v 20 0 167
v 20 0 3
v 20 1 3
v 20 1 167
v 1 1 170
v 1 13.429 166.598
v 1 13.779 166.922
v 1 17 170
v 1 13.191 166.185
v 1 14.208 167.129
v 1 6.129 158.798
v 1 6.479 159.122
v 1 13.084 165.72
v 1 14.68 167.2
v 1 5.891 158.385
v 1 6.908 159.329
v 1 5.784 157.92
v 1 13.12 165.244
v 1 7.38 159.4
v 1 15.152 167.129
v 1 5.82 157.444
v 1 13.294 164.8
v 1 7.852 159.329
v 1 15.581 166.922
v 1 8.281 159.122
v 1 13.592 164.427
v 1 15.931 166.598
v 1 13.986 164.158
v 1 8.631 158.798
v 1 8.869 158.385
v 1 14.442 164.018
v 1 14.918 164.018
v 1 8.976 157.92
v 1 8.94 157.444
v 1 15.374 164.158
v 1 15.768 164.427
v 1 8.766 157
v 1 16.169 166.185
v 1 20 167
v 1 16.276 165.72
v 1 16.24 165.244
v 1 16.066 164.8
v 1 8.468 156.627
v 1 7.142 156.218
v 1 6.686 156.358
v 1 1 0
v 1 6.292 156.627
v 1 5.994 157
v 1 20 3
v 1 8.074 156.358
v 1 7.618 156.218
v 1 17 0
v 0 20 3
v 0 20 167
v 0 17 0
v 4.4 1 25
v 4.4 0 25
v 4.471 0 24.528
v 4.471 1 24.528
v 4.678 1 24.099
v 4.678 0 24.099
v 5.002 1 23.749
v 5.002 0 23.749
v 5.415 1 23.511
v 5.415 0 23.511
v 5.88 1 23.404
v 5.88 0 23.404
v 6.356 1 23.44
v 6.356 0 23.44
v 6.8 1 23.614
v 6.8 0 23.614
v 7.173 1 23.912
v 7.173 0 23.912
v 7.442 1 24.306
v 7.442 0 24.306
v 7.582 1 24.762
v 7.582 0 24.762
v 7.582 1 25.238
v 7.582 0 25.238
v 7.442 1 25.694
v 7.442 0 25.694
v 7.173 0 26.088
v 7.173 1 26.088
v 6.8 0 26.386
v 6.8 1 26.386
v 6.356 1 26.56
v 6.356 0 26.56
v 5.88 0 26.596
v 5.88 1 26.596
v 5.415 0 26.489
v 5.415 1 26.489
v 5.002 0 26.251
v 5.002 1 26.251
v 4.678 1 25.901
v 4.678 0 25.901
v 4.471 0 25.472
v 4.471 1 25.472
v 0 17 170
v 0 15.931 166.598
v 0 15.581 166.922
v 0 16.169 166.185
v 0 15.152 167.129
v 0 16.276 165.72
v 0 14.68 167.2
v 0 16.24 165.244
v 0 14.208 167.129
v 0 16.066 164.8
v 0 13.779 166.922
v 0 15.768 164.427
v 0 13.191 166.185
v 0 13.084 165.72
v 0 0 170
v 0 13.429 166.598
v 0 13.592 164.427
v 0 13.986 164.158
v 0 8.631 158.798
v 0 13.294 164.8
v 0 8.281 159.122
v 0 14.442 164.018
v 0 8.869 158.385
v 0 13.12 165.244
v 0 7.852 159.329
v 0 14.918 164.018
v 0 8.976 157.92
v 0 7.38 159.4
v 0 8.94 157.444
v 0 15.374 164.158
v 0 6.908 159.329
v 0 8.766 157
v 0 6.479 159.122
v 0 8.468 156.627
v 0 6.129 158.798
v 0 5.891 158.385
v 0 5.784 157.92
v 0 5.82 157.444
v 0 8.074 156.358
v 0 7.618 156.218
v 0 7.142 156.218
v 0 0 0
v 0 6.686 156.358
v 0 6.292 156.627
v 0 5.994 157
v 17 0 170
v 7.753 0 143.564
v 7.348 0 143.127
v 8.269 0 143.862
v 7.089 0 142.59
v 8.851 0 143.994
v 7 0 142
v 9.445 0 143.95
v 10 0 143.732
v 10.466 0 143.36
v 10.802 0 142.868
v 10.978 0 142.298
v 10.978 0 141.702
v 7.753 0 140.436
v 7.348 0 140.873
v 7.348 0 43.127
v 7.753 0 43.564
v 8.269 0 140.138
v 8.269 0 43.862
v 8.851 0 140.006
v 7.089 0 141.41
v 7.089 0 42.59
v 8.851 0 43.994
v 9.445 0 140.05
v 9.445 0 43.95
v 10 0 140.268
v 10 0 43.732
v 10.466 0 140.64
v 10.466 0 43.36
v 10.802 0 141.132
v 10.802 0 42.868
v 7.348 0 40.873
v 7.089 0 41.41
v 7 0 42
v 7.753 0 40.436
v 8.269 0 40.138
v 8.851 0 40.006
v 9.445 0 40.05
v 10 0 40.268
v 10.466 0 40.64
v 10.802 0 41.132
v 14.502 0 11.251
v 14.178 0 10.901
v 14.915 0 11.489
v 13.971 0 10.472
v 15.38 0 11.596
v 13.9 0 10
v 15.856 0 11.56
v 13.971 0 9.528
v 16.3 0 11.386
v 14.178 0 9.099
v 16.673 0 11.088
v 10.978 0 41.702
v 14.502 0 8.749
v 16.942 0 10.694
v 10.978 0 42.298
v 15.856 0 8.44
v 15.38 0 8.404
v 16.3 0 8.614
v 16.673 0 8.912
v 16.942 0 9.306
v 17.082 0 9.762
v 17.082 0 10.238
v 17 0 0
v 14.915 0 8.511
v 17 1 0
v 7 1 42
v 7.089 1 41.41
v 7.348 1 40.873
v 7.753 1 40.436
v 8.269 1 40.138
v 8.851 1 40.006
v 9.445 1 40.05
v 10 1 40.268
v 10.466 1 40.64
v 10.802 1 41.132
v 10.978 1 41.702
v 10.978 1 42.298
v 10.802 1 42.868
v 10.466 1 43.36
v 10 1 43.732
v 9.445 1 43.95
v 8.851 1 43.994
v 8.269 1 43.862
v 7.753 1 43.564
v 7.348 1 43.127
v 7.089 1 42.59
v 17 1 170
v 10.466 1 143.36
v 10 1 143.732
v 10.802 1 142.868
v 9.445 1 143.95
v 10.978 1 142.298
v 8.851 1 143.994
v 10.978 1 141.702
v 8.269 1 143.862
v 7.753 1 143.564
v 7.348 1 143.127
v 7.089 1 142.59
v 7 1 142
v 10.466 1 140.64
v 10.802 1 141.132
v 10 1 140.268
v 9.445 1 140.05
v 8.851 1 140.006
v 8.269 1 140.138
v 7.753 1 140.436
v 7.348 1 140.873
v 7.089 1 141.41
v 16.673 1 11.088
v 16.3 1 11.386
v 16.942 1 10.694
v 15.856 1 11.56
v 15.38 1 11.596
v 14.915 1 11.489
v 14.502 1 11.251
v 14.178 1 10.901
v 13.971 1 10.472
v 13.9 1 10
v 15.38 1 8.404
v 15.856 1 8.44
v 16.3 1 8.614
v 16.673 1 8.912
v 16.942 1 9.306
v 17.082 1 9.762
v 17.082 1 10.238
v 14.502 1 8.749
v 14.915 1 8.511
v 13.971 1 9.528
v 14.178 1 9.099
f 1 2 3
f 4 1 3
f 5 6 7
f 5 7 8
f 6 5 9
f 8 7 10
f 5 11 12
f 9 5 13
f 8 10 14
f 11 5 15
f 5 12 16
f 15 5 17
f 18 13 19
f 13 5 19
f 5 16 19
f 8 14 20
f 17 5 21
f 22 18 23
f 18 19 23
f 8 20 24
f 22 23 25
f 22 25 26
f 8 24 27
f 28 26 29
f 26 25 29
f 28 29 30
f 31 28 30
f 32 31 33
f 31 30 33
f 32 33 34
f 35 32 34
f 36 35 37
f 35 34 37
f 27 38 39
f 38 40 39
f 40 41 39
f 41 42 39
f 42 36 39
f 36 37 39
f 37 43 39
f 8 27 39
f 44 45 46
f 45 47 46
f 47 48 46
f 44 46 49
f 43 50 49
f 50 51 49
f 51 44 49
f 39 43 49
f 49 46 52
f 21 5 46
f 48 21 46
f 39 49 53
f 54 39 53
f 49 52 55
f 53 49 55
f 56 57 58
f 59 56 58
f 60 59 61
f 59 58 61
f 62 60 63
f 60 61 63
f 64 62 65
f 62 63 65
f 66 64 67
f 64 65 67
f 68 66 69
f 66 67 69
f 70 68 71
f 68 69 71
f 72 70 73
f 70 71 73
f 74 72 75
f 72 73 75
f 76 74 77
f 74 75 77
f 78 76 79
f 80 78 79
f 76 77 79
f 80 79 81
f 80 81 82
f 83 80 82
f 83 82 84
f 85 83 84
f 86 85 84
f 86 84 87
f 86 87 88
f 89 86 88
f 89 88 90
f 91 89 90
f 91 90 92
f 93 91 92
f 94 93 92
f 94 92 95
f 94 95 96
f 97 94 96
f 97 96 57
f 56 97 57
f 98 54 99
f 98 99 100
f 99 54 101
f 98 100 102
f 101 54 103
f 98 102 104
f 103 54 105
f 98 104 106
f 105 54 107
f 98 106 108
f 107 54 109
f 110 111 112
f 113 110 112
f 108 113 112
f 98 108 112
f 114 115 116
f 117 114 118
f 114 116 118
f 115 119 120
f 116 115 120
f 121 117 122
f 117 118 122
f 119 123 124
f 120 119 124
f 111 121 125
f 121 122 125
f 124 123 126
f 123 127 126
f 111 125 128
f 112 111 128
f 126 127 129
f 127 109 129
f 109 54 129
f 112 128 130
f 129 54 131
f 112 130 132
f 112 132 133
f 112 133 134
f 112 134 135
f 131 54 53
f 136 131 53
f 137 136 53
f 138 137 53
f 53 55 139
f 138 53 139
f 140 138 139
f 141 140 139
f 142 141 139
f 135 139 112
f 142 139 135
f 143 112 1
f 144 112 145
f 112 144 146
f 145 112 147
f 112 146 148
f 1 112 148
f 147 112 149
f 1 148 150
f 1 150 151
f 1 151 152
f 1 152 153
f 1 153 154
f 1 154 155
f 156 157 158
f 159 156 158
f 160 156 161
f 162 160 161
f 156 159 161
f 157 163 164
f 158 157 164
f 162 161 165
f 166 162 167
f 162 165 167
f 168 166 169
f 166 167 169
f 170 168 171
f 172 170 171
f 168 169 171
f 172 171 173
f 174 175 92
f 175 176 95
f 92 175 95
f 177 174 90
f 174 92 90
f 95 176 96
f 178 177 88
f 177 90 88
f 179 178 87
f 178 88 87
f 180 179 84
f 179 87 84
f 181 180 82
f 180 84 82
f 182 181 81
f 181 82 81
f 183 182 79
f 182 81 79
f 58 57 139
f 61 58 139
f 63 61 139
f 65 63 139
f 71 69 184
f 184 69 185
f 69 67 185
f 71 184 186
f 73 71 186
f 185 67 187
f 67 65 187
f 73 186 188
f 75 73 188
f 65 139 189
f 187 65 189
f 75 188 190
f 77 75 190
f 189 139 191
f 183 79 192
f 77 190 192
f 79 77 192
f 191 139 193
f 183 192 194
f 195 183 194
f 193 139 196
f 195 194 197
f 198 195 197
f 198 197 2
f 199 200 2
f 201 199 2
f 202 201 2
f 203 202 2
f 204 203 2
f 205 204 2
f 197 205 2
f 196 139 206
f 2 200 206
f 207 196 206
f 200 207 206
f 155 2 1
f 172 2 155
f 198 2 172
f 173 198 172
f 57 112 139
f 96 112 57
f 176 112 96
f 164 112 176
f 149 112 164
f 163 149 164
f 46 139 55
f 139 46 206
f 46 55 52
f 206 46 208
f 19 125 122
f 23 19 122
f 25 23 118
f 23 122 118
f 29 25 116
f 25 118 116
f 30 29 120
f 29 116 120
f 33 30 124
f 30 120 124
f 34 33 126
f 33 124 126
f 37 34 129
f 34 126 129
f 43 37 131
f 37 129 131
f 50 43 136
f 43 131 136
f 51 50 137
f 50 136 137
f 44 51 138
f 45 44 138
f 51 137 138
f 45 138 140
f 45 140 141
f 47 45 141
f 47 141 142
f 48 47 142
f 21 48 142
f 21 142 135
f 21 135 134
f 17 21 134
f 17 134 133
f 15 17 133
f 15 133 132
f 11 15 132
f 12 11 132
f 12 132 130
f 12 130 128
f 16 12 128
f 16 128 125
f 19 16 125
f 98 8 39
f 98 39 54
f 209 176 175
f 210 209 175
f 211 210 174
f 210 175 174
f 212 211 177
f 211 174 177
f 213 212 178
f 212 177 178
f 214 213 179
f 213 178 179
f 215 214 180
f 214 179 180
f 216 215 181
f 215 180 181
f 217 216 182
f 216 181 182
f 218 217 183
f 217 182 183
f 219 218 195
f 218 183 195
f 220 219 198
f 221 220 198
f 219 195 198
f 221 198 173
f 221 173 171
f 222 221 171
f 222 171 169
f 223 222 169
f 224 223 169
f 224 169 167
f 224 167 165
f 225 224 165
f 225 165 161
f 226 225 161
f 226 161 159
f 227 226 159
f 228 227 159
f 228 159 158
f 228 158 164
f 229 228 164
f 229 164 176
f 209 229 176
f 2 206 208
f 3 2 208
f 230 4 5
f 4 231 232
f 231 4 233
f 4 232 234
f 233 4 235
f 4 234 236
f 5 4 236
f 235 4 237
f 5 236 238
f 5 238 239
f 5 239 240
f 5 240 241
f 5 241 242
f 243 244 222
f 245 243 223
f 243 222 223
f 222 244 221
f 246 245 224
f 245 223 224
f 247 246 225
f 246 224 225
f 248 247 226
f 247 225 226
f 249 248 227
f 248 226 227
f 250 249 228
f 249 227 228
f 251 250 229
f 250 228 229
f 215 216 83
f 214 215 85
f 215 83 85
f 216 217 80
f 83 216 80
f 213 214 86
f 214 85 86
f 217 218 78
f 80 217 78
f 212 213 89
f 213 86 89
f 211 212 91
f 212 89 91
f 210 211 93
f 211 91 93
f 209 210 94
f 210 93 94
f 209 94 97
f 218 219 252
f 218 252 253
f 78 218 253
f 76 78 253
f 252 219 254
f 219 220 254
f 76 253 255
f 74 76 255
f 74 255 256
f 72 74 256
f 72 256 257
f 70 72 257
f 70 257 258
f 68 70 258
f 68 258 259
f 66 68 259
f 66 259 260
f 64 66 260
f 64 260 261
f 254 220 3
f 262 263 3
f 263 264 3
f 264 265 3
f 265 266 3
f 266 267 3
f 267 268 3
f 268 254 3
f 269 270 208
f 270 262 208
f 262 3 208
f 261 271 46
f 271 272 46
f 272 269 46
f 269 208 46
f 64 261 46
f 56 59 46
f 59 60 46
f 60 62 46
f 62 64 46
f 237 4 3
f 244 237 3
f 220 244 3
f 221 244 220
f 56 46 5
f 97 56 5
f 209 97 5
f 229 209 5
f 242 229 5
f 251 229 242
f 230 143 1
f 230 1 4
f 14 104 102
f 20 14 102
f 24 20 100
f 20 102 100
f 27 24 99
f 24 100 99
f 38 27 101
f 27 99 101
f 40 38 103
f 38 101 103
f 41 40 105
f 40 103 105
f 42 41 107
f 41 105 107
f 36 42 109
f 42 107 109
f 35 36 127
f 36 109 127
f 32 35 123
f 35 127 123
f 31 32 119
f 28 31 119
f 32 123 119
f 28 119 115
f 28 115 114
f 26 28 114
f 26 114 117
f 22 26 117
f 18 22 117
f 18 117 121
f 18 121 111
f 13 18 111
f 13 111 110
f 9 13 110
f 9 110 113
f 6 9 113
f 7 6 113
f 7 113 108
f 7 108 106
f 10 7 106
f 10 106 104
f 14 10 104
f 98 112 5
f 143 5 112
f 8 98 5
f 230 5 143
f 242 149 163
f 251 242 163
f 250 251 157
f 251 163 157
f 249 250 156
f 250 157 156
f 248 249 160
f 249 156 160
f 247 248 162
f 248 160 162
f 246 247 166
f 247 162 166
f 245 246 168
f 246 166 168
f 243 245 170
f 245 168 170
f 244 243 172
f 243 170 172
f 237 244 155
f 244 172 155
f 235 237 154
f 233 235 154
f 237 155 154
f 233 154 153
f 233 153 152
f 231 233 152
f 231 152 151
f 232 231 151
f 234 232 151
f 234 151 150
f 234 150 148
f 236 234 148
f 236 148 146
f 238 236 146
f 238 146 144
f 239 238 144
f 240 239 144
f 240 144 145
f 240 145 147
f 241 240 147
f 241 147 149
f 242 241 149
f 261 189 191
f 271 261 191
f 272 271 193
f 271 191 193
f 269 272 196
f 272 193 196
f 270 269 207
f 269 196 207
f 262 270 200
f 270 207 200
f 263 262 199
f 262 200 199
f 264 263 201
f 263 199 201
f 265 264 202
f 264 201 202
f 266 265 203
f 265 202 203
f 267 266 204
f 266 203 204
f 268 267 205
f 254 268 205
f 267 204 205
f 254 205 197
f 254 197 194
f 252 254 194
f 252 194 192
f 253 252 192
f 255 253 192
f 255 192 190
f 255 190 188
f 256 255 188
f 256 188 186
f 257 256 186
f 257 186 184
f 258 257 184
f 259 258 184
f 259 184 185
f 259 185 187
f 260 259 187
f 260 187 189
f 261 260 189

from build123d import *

# Parameters (mm, degrees)
BASE_DEPTH                      = 170
CHAMFEREDGES_SIZE               = 3
F_4_0_4_CABLE_TIE_HOLES_D       = 4
F_3_1_3_1_CABLECHAINSIDEHOLES_D = 3.2
F_3_2_3_2_CARRIAGESIDE_D        = 3.2


with BuildPart() as part:
    # Sketch1 → Base (new body)
    with BuildSketch(Plane.XY):
        Polygon((0, 0), (20, 0), (20, 1), (1, 1), (1, 20), (0, 20), align=None)
    extrude(amount=BASE_DEPTH)

    # ChamferEdges
    chamferedges_edges = [part.edges().sort_by_distance(p)[0] for p in [
        (20, 0.5, 170),
        (0.5, 20, 170),
        (0.5, 20, 0),
        (20, 0.5, 0),
    ]]
    chamfer(chamferedges_edges, length=CHAMFEREDGES_SIZE)

    # Ø4.0 (4) Cable tie Holes (through all)
    with Locations(Plane(origin=(0, 1, 0), x_dir=(1, 0, 0), z_dir=(0, 1, 0))):
        with Locations((9, -42), (9, -142)):
            Hole(F_4_0_4_CABLE_TIE_HOLES_D / 2)

    # Ø3.1 (3.1) CableChainSideHoles (through all)
    with Locations(Plane(origin=(1, 0, 0), x_dir=(0, 0, -1), z_dir=(1, 0, 0))):
        with Locations((-165.6, 14.68), (-157.8, 7.38)):
            Hole(F_3_1_3_1_CABLECHAINSIDEHOLES_D / 2)

    # Ø3.2 (3.2) CarriageSide (through all)
    with Locations(Plane(origin=(0, 1, 0), x_dir=(1, 0, 0), z_dir=(0, 1, 0))):
        with Locations((15.5, -10), (6, -25)):
            Hole(F_3_2_3_2_CARRIAGESIDE_D / 2)


solid = part.part
